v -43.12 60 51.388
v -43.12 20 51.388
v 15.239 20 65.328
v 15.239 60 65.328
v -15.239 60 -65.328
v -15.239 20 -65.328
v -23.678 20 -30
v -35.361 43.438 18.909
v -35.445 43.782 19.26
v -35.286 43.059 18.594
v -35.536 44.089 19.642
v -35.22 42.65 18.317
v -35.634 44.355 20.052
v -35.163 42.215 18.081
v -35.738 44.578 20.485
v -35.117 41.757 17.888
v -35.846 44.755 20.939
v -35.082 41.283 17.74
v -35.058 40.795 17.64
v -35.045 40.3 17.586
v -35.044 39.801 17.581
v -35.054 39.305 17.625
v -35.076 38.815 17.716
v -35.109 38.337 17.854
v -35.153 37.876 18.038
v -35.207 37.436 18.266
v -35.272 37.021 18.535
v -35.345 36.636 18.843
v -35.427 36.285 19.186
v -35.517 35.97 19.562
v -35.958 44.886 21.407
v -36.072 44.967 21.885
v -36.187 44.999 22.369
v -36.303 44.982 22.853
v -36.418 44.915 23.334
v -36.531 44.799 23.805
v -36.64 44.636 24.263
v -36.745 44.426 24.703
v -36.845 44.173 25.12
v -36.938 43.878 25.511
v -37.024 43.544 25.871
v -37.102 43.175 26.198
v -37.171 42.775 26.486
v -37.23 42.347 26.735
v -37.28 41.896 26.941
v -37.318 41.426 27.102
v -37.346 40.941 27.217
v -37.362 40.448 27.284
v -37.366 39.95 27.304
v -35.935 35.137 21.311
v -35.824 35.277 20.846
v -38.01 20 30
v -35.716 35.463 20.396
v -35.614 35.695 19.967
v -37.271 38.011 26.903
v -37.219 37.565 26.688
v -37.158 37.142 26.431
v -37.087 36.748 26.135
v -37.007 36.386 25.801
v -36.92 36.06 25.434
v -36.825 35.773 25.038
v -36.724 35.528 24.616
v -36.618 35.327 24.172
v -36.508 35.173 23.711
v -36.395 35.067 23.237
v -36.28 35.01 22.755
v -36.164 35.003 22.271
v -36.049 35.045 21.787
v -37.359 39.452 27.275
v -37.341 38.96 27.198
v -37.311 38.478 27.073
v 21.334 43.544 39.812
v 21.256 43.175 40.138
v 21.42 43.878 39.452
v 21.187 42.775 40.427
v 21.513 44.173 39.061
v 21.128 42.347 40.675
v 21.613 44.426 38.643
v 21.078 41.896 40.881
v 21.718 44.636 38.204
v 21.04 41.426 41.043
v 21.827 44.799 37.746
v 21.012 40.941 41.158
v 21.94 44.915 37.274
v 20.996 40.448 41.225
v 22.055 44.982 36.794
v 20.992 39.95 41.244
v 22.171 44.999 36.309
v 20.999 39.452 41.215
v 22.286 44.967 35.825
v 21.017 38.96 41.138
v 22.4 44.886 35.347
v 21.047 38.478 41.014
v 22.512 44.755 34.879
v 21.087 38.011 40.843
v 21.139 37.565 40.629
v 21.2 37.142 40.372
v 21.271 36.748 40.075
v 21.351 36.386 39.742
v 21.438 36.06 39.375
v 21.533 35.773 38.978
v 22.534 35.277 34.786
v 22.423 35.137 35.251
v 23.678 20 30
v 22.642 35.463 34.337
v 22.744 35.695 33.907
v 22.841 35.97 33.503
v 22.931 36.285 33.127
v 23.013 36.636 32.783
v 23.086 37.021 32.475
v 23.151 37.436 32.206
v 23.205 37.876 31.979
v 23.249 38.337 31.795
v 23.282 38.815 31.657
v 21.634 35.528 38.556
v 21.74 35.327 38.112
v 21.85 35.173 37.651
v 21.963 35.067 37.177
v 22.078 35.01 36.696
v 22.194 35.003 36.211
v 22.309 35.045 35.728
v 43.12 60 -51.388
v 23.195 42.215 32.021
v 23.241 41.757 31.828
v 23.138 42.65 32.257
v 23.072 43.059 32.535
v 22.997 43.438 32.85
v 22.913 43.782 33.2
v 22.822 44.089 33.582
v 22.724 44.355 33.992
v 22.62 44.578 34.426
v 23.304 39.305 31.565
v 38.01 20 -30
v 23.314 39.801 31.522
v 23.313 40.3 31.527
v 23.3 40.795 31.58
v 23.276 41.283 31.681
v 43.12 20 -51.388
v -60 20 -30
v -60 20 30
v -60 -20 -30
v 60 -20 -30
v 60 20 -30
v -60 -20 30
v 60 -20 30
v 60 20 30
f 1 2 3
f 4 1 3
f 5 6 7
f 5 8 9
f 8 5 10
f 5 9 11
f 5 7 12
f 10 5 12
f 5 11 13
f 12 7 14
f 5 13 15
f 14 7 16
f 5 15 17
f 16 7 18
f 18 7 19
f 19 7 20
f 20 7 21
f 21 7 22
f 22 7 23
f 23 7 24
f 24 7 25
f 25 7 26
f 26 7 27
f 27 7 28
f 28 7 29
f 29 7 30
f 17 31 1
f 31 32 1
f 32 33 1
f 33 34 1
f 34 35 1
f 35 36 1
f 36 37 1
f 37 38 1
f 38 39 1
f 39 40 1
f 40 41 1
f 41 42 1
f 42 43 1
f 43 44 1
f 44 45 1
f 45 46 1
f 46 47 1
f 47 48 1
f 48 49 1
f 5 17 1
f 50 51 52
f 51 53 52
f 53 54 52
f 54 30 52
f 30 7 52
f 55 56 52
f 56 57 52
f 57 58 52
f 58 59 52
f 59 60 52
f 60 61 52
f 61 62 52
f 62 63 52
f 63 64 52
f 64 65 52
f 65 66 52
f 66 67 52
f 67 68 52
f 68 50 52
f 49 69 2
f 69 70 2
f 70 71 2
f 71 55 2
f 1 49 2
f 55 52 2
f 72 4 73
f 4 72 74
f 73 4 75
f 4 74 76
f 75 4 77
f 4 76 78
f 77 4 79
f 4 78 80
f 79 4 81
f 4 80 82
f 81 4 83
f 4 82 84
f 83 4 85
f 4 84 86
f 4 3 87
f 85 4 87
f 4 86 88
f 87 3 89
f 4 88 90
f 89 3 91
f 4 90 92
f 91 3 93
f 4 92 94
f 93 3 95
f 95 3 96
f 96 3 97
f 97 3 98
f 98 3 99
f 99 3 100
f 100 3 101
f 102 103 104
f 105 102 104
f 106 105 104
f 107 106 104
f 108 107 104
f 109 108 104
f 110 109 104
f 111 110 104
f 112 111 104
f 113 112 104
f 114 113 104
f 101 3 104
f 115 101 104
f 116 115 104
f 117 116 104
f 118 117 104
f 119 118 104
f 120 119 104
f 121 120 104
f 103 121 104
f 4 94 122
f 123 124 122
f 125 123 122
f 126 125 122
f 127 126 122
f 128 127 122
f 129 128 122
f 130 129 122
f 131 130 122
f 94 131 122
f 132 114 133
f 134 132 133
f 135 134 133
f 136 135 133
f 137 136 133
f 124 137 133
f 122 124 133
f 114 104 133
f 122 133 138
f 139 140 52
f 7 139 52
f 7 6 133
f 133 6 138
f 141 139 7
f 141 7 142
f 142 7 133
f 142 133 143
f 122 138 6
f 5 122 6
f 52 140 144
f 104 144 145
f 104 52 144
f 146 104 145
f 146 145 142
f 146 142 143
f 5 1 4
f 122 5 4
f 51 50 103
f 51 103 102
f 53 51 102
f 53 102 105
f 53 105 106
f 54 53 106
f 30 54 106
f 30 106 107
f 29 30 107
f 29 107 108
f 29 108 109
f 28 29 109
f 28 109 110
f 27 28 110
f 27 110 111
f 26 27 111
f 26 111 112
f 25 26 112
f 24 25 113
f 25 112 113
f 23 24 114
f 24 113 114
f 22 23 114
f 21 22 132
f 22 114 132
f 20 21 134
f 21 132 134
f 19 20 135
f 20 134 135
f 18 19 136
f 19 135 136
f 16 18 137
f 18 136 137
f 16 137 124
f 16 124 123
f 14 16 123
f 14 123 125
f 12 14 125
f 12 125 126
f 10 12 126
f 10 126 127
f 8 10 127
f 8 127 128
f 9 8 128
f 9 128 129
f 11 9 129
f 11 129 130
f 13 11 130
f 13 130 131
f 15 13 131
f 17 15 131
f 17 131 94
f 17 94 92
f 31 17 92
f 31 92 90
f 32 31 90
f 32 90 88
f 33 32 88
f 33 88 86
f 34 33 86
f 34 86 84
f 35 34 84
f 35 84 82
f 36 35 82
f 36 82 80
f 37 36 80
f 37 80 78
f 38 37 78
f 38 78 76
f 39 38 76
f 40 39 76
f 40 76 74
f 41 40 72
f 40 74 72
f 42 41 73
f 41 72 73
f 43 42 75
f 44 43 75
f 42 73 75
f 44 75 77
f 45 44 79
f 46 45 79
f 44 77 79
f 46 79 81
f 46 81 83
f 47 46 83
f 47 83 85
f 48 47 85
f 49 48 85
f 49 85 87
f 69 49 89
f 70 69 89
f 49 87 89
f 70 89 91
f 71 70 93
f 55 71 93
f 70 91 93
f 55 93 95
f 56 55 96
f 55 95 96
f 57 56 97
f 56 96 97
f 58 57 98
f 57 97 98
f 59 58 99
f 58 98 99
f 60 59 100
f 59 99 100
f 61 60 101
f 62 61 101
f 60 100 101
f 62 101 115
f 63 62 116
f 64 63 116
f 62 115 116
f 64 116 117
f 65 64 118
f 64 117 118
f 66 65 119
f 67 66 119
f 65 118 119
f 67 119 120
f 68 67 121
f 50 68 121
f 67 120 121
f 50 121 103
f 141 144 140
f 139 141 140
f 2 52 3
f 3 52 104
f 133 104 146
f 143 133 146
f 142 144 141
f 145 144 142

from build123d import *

# Parameters (mm, degrees)
SKETCH1_W           = 120
SKETCH1_H           = 40
BOSS_EXTRUDE1_DEPTH = 30
BOSS_EXTRUDE2_DEPTH = 40
SKETCH3_R           = 5
CUT_EXTRUDE1_DEPTH  = 104.536516906


with BuildPart() as part:
    # Sketch1 → Boss-Extrude1 (new body, symmetric)
    with BuildSketch(Plane.XY):
        Rectangle(SKETCH1_W, SKETCH1_H)
    extrude(amount=BOSS_EXTRUDE1_DEPTH, both=True)

    # Sketch2 → Boss-Extrude2 (add)
    with BuildSketch(Plane(origin=(0, 20, 0), x_dir=(1, 0, 0), z_dir=(0, 1, 0))):
        Polygon((-15.23855654, 65.328297043), (-43.119503711, -51.387823458), (15.23855654, -65.328297043), (43.119503711, 51.387823458), align=None)
    extrude(amount=BOSS_EXTRUDE2_DEPTH)

    # Sketch3 → Cut-Extrude1 (cut, through all)
    with BuildSketch(Plane(origin=(29.179030125, 50, 6.970236793), x_dir=(0.053982445, -0.972634338, -0.225983055), z_dir=(0.972634338, 0, 0.232341226))):
        with Locations((2.700680063, -31.734470672)):
            Circle(SKETCH3_R)
    extrude(amount=-CUT_EXTRUDE1_DEPTH, mode=Mode.SUBTRACT)


solid = part.part
